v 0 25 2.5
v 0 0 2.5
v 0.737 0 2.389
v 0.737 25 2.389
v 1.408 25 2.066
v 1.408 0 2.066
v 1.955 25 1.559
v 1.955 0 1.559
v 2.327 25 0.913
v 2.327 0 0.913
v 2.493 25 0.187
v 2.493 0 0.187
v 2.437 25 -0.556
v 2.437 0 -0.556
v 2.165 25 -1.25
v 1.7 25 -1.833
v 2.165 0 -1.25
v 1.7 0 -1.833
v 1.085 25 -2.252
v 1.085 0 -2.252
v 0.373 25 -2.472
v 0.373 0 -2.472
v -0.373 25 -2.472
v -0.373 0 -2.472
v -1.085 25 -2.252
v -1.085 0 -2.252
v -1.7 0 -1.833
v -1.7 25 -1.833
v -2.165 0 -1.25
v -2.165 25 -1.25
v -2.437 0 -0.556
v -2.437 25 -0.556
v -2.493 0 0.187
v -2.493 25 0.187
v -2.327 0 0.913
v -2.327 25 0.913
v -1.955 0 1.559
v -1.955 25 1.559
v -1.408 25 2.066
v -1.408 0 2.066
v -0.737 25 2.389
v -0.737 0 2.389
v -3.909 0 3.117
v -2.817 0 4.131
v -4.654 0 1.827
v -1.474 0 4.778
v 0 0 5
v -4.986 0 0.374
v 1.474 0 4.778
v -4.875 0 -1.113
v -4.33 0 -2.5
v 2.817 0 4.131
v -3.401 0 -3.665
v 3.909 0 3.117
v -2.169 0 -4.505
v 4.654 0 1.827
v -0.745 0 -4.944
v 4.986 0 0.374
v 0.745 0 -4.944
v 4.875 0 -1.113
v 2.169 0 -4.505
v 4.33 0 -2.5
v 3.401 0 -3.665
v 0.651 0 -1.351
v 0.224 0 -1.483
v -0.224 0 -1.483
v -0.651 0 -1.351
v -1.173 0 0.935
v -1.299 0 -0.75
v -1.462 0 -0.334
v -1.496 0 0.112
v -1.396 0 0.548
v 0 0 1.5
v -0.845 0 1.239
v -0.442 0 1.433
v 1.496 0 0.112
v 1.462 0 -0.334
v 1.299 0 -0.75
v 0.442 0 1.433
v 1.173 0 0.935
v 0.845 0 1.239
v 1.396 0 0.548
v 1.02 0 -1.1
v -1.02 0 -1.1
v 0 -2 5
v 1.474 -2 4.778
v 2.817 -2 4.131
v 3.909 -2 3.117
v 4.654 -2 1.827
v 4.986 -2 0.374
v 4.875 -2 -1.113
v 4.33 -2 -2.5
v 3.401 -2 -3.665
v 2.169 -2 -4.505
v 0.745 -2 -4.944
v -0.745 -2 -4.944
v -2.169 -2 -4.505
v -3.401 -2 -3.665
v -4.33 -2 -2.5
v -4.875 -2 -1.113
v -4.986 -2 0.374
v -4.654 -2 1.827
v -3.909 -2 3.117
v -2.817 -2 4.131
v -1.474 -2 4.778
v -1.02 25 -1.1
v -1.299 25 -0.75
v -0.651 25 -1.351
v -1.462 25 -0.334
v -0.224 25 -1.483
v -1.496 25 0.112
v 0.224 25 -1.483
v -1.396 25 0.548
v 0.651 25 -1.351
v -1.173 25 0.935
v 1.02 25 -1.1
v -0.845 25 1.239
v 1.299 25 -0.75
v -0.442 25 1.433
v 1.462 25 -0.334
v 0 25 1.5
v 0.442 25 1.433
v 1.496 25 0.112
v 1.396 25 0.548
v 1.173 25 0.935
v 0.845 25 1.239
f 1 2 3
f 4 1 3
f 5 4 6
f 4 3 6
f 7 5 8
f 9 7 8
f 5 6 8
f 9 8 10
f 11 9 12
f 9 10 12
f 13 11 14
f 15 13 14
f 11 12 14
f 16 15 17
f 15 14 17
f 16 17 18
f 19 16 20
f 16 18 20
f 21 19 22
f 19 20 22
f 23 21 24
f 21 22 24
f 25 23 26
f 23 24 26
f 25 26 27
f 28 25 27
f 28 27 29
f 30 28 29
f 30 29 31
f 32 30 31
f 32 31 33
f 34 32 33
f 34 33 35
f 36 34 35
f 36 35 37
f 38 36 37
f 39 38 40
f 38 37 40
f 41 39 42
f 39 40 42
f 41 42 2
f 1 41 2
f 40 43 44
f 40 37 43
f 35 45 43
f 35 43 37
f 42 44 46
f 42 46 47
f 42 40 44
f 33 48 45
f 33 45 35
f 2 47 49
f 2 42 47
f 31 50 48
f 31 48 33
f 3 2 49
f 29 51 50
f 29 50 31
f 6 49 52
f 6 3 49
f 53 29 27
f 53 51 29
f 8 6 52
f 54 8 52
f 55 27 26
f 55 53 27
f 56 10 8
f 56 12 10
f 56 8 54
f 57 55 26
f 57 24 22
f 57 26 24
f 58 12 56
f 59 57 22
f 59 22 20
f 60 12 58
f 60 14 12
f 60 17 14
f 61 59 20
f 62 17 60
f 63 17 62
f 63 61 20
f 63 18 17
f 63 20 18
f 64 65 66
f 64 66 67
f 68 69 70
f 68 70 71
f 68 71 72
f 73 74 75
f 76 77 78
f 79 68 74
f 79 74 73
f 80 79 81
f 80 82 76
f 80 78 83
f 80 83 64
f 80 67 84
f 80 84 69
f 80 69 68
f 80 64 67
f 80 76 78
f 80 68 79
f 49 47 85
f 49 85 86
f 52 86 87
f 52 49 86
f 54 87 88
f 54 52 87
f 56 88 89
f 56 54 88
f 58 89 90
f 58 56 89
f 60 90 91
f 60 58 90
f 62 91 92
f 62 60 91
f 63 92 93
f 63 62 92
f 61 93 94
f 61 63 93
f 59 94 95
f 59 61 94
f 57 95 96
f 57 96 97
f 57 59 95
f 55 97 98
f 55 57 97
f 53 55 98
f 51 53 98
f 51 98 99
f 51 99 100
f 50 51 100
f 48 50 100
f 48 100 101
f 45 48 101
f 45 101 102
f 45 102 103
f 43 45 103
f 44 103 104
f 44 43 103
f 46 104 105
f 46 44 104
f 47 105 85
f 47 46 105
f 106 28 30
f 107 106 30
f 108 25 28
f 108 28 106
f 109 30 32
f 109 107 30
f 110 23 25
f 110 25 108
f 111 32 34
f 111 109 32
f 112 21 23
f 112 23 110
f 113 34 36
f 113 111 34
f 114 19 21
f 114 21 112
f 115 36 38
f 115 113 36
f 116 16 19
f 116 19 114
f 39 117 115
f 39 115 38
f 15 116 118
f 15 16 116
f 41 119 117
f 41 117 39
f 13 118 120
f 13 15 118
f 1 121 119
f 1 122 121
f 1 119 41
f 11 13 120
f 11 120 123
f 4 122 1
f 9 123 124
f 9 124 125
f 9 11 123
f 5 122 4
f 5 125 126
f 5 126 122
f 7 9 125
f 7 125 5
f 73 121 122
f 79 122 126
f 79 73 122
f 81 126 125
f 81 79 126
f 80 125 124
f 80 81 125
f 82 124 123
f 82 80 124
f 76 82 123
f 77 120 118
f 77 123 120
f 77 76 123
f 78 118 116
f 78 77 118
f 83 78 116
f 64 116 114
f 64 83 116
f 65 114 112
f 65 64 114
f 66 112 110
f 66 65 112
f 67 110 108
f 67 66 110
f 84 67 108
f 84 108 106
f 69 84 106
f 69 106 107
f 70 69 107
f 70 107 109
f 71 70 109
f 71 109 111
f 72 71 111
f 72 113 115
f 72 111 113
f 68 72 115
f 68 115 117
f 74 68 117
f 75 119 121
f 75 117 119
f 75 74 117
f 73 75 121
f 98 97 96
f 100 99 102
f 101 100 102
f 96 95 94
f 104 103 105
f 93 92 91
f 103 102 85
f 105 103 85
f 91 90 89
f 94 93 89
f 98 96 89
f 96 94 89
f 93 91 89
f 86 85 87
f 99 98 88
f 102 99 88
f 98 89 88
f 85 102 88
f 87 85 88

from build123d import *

# Parameters (mm, degrees)
SKETCH2_R           = 5
SKETCH2_R_2         = 2.5
BOSS_EXTRUDE1_DEPTH = 2
SKETCH2_3_R         = 2.5
BOSS_EXTRUDE2_DEPTH = 25
CUT_EXTRUDE1_START  = -25
SKETCH3_R           = 1.5
CUT_EXTRUDE1_DEPTH  = 53.910571474


with BuildPart() as part:
    # Sketch2 → Boss-Extrude1 (new body)
    # profile 1 of 2: a face of its own
    with BuildSketch(Plane(origin=(0, 0, 0), x_dir=(1, 0, 0), z_dir=(0, 1, 0))):
        with Locations(Location((0, 0, 0), (0, 0, 270))):
            Circle(SKETCH2_R)
        Circle(SKETCH2_R_2, mode=Mode.SUBTRACT)
    # profile 2 of 2: a face of its own
    with BuildSketch(Plane(origin=(0, 0, 0), x_dir=(1, 0, 0), z_dir=(0, 1, 0))):
        Circle(SKETCH2_R_2)
    extrude(amount=-BOSS_EXTRUDE1_DEPTH)

    # Sketch2<3> → Boss-Extrude2 (add)
    with BuildSketch(Plane(origin=(0, 0, 0), x_dir=(1, 0, 0), z_dir=(0, 1, 0))):
        with Locations(Location((0, 0, 0), (0, 0, 270))):
            Circle(SKETCH2_3_R)
    extrude(amount=BOSS_EXTRUDE2_DEPTH)

    # Sketch3 → Cut-Extrude1 (cut, through all)
    with BuildSketch(Plane(origin=(0, 25, 0), x_dir=(1, 0, 0), z_dir=(0, 1, 0)).offset(CUT_EXTRUDE1_START)):
        with Locations(Location((0, 0, 0), (0, 0, 270))):
            Circle(SKETCH3_R)
    extrude(amount=CUT_EXTRUDE1_DEPTH, mode=Mode.SUBTRACT)


solid = part.part
